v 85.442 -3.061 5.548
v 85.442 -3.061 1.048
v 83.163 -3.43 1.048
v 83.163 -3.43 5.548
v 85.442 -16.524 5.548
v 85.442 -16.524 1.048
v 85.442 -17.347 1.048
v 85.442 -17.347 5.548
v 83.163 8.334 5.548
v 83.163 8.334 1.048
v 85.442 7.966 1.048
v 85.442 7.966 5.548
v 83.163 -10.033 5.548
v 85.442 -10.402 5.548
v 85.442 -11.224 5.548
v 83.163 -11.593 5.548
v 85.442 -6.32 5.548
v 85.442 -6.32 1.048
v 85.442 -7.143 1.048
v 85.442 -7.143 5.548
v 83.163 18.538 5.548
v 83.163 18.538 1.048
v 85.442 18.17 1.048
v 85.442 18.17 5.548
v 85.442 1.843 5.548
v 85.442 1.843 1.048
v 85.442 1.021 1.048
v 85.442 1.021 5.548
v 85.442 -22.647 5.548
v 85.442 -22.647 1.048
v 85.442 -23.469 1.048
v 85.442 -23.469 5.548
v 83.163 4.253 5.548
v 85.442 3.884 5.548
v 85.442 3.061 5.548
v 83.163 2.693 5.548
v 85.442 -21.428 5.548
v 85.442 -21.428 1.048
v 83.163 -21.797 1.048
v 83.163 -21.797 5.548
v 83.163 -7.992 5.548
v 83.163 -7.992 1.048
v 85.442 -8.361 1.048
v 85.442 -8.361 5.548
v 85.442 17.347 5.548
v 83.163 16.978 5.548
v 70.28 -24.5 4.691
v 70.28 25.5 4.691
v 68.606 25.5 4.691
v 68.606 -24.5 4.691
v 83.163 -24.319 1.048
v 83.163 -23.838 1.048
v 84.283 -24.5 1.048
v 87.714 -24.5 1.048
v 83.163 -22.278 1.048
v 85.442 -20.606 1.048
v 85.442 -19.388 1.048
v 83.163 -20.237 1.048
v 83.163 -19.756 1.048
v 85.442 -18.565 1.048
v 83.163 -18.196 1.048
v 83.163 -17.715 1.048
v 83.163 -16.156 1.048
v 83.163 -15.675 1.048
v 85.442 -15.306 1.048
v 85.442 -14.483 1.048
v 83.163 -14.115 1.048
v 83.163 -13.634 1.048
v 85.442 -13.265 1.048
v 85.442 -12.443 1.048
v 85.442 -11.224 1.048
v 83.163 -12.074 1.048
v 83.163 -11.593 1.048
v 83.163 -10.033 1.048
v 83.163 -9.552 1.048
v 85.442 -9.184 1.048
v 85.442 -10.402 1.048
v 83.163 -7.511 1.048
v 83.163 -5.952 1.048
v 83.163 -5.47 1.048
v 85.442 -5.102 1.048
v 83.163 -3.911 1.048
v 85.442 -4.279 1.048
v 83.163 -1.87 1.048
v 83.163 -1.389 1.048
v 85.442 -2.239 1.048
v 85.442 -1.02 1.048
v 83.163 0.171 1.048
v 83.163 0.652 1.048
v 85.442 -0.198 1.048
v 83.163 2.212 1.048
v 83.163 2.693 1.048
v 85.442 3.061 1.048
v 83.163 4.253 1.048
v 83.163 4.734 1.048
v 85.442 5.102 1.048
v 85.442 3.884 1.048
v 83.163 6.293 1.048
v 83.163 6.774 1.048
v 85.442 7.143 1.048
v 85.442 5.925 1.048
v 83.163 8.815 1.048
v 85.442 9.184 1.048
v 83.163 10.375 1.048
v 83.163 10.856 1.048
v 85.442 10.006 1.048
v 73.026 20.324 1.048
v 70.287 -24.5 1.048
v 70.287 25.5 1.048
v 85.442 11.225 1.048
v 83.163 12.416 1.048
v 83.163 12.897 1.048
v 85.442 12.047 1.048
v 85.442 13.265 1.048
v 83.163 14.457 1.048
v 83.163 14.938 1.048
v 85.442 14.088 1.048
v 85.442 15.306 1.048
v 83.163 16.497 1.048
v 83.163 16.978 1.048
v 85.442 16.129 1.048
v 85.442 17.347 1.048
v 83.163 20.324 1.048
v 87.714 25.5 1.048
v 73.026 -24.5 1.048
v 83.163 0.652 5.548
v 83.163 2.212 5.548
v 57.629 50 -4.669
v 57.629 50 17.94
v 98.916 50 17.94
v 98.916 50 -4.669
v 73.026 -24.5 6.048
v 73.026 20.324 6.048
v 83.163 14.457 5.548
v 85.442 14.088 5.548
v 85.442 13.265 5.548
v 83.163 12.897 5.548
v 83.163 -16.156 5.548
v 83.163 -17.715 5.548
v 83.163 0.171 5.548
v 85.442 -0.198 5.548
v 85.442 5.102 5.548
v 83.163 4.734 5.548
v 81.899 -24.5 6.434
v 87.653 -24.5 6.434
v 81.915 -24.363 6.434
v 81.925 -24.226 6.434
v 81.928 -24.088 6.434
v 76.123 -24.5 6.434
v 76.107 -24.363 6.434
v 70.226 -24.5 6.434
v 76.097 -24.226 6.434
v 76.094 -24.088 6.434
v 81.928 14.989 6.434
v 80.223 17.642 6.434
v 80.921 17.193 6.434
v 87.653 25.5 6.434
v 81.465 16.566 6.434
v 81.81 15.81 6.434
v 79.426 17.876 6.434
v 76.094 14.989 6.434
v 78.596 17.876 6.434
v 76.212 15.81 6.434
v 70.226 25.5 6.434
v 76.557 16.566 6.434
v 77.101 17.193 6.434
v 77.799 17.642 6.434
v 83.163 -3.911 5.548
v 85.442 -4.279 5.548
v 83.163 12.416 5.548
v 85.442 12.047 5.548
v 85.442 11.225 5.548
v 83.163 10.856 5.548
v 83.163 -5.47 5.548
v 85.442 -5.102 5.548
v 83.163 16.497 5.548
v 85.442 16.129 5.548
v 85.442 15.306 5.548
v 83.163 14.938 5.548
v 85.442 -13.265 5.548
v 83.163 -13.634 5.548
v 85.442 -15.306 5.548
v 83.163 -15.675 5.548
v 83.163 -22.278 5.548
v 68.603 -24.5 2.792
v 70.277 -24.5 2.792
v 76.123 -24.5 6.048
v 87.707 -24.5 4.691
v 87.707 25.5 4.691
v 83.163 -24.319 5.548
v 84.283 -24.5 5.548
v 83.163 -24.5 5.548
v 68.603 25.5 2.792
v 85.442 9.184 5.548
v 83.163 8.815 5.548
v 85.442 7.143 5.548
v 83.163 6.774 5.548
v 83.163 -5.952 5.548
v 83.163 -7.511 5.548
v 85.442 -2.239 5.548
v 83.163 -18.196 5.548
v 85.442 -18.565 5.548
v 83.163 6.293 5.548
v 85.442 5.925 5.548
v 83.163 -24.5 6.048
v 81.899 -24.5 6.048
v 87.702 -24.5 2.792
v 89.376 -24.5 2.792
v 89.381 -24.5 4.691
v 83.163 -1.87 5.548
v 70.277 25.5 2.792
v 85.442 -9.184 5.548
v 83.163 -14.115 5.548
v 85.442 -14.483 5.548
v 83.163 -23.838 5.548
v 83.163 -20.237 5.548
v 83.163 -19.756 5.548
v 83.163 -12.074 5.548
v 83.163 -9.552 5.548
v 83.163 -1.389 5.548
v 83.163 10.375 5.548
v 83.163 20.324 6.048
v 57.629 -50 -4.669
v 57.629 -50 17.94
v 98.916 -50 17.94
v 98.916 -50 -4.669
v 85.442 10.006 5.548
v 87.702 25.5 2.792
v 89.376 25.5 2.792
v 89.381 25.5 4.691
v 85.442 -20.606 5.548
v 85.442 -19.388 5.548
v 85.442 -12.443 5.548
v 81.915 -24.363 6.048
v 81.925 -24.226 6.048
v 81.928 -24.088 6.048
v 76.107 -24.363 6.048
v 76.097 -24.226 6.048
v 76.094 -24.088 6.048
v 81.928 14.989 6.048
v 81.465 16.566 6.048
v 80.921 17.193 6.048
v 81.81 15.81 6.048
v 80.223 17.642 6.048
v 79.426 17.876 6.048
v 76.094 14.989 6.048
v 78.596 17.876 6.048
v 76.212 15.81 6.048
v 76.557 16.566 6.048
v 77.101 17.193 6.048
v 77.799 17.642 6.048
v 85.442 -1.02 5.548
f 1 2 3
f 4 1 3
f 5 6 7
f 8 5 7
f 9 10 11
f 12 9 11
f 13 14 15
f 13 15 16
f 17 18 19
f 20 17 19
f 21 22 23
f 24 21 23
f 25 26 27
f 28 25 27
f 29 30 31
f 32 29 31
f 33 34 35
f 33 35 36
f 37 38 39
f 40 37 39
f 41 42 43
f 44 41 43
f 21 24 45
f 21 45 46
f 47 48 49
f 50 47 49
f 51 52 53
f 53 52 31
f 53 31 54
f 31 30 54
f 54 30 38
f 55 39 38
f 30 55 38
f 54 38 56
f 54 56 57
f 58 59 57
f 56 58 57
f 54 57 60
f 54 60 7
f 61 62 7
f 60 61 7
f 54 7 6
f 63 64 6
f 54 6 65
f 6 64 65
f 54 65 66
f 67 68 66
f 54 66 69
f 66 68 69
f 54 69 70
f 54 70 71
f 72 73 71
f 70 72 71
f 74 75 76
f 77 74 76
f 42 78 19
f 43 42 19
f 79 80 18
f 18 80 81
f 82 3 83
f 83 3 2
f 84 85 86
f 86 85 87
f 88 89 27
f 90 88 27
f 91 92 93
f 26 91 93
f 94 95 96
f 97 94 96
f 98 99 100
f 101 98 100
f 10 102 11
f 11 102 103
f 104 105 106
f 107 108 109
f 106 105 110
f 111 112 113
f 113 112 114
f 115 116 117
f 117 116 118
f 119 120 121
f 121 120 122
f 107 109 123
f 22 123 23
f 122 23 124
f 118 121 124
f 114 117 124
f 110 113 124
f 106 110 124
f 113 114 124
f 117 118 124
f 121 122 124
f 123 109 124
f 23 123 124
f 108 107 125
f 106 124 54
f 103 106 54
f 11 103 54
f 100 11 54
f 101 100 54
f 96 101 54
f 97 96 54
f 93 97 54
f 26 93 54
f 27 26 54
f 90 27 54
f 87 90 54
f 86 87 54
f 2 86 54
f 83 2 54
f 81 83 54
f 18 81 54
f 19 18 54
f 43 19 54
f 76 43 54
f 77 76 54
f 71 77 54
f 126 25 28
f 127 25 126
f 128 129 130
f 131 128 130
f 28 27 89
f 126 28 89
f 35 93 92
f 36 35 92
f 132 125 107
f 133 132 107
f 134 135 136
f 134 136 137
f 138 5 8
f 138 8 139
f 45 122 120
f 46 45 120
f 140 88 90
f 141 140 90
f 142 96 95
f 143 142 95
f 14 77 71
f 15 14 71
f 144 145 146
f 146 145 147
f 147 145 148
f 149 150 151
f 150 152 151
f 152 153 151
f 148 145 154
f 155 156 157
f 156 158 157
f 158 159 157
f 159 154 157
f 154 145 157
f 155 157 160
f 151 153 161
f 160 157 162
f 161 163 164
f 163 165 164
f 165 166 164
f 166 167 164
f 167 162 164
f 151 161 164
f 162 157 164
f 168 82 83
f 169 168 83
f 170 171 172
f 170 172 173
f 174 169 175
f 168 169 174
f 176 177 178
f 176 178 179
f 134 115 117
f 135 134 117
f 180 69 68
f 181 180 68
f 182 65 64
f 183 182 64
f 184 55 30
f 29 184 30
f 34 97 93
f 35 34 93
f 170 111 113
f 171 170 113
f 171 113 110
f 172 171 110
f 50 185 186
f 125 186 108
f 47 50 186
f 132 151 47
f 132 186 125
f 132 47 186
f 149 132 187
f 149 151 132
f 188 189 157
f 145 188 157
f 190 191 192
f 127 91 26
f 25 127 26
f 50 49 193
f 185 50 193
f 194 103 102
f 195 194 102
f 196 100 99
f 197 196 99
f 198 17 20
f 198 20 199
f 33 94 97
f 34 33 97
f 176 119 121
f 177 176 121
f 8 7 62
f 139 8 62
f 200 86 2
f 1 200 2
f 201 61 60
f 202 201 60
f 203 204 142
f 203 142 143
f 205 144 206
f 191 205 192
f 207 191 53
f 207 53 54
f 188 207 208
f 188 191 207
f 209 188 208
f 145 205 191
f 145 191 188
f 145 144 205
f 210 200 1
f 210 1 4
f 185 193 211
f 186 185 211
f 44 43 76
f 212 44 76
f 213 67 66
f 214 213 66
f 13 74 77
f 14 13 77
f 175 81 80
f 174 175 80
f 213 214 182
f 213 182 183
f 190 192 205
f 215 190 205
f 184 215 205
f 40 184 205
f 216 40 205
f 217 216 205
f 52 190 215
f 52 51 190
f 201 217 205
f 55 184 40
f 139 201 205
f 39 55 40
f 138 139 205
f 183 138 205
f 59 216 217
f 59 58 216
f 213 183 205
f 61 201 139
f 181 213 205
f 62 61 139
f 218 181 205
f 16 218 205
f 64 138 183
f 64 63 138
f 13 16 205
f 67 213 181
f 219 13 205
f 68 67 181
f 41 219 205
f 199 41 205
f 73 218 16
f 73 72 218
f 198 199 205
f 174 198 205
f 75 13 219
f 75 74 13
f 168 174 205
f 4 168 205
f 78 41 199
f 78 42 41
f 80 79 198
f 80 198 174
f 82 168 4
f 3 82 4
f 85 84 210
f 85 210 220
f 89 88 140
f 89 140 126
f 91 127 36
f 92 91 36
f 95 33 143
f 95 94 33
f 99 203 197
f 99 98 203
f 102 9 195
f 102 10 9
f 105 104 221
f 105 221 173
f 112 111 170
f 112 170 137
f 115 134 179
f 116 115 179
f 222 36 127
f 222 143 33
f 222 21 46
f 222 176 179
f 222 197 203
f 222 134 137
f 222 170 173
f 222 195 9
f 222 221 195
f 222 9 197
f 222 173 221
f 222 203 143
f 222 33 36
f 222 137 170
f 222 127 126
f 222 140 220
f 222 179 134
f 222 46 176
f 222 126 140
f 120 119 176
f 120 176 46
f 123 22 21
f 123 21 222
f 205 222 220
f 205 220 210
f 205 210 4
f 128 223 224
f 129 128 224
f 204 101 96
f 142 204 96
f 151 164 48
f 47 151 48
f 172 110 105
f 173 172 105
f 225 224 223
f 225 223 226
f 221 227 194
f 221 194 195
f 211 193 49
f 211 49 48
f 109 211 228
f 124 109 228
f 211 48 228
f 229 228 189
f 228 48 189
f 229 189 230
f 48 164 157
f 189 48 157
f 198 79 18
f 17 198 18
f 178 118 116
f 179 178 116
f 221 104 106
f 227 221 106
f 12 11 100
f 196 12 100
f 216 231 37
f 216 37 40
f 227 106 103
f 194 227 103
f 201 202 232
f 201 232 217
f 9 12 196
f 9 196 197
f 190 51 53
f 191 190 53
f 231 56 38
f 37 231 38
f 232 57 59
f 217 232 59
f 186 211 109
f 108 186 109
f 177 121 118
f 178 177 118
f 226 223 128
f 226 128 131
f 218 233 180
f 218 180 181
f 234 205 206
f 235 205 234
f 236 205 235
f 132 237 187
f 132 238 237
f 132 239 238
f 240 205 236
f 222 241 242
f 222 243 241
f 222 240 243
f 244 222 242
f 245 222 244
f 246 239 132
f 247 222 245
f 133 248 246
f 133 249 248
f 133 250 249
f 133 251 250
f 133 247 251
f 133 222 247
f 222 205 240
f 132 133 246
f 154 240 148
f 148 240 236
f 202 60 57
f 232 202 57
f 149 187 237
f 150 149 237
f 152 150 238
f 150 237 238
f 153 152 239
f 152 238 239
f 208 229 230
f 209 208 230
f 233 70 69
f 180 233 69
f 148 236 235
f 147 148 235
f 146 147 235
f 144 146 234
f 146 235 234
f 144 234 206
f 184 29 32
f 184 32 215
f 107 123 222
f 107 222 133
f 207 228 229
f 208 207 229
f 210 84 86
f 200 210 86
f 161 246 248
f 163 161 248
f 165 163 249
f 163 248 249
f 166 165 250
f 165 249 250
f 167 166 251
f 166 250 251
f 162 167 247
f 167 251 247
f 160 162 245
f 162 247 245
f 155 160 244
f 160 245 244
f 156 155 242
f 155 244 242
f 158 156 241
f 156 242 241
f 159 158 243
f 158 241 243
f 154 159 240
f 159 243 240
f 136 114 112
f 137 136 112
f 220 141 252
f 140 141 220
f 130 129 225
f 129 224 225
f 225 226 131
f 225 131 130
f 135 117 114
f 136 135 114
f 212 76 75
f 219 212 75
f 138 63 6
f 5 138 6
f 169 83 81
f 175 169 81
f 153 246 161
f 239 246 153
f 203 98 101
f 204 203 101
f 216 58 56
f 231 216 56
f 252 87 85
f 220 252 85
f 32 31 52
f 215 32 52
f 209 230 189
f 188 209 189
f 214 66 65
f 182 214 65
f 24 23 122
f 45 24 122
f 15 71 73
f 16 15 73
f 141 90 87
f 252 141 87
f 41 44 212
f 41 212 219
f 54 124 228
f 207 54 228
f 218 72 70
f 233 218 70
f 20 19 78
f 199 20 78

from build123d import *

# Parameters (mm, degrees)
SKETCH011_W         = 41.286587
SKETCH011_H         = 22.609322
PAD004_DEPTH        = 50
PAD003_DEPTH        = 50
SKETCH009_W         = 10.137305
SKETCH009_H         = 44.950935
POCKET005_DEPTH     = 5
POCKET006_DEPTH     = 0.386998
POCKET007_DEPTH     = 4.5
LINEARPATTERN_COUNT = 50
LINEARPATTERN_PITCH = 2.040816


with BuildPart() as scatolozzo_selezione_prototipi:
    # Sketch011 → Pad004 (new body, symmetric)
    with BuildSketch(Plane.XZ):
        with Locations((78.272493, 6.635345)):
            Rectangle(SKETCH011_W, SKETCH011_H)
    extrude(amount=PAD004_DEPTH, both=True)


with BuildPart() as pezzo_scorrevole_denti:
    # Sketch008 → Pad003 (new body)
    with BuildSketch(Plane(origin=(0, 25.5, 0), x_dir=(-1, 0, 0), z_dir=(0, 1, 0))):
        Polygon((-87.702065, 2.792236), (-89.376048, 2.792236), (-89.380697, 4.691212), (-87.706714, 4.691212), (-87.65287, 6.434328), (-70.225892, 6.434328), (-70.28012, 4.691224), (-68.606136, 4.691224), (-68.602594, 2.792246), (-70.276578, 2.792246), (-70.286952, 1.048329), (-87.71393, 1.048329), align=None)
    extrude(amount=-PAD003_DEPTH)

    # Sketch009 → Pocket005 (cut)
    with BuildSketch(Plane(origin=(0, 25.5, 1.048329), x_dir=(-1, 0, 0), z_dir=(0, 0, -1))):
        with Locations((-78.094455, -27.651439)):
            Rectangle(SKETCH009_W, SKETCH009_H)
    extrude(amount=-POCKET005_DEPTH, mode=Mode.SUBTRACT)

    # Sketch010 → Pocket006 (cut, through all)
    with BuildSketch(Plane(origin=(0, 25.5, 6.048329), x_dir=(-1, 0, 0), z_dir=(0, 0, -1))):
        with BuildLine():
            ThreePointArc((-76.093689, -10.5114), (-79.010852, -7.594237), (-81.928015, -10.5114))
            Line((-81.928015, -10.5114), (-81.928015, -49.588167))
            ThreePointArc((-81.928015, -49.588167), (-79.010852, -52.50533), (-76.093689, -49.588167))
            Line((-76.093689, -10.5114), (-76.093689, -49.588167))
        make_face()
    extrude(amount=-POCKET006_DEPTH, mode=Mode.SUBTRACT)

    # Sketch012 → Pocket007 (cut)
    with BuildSketch(Plane(origin=(0, 25.5, 1.048329), x_dir=(-1, 0, 0), z_dir=(0, 0, -1))):
        Polygon((-85.44191, -7.330385), (-85.44191, -8.152901), (-82.350922, -8.652901), (-82.350922, -6.830385), align=None)
    pocket007 = extrude(amount=-POCKET007_DEPTH, mode=Mode.SUBTRACT)

    # LinearPattern: Pocket007 ×50
    with Locations(*[(0, -i * LINEARPATTERN_PITCH, 0) for i in range(1, LINEARPATTERN_COUNT)]):
        add(pocket007, mode=Mode.SUBTRACT)


solid = Compound([scatolozzo_selezione_prototipi.part, pezzo_scorrevole_denti.part])
